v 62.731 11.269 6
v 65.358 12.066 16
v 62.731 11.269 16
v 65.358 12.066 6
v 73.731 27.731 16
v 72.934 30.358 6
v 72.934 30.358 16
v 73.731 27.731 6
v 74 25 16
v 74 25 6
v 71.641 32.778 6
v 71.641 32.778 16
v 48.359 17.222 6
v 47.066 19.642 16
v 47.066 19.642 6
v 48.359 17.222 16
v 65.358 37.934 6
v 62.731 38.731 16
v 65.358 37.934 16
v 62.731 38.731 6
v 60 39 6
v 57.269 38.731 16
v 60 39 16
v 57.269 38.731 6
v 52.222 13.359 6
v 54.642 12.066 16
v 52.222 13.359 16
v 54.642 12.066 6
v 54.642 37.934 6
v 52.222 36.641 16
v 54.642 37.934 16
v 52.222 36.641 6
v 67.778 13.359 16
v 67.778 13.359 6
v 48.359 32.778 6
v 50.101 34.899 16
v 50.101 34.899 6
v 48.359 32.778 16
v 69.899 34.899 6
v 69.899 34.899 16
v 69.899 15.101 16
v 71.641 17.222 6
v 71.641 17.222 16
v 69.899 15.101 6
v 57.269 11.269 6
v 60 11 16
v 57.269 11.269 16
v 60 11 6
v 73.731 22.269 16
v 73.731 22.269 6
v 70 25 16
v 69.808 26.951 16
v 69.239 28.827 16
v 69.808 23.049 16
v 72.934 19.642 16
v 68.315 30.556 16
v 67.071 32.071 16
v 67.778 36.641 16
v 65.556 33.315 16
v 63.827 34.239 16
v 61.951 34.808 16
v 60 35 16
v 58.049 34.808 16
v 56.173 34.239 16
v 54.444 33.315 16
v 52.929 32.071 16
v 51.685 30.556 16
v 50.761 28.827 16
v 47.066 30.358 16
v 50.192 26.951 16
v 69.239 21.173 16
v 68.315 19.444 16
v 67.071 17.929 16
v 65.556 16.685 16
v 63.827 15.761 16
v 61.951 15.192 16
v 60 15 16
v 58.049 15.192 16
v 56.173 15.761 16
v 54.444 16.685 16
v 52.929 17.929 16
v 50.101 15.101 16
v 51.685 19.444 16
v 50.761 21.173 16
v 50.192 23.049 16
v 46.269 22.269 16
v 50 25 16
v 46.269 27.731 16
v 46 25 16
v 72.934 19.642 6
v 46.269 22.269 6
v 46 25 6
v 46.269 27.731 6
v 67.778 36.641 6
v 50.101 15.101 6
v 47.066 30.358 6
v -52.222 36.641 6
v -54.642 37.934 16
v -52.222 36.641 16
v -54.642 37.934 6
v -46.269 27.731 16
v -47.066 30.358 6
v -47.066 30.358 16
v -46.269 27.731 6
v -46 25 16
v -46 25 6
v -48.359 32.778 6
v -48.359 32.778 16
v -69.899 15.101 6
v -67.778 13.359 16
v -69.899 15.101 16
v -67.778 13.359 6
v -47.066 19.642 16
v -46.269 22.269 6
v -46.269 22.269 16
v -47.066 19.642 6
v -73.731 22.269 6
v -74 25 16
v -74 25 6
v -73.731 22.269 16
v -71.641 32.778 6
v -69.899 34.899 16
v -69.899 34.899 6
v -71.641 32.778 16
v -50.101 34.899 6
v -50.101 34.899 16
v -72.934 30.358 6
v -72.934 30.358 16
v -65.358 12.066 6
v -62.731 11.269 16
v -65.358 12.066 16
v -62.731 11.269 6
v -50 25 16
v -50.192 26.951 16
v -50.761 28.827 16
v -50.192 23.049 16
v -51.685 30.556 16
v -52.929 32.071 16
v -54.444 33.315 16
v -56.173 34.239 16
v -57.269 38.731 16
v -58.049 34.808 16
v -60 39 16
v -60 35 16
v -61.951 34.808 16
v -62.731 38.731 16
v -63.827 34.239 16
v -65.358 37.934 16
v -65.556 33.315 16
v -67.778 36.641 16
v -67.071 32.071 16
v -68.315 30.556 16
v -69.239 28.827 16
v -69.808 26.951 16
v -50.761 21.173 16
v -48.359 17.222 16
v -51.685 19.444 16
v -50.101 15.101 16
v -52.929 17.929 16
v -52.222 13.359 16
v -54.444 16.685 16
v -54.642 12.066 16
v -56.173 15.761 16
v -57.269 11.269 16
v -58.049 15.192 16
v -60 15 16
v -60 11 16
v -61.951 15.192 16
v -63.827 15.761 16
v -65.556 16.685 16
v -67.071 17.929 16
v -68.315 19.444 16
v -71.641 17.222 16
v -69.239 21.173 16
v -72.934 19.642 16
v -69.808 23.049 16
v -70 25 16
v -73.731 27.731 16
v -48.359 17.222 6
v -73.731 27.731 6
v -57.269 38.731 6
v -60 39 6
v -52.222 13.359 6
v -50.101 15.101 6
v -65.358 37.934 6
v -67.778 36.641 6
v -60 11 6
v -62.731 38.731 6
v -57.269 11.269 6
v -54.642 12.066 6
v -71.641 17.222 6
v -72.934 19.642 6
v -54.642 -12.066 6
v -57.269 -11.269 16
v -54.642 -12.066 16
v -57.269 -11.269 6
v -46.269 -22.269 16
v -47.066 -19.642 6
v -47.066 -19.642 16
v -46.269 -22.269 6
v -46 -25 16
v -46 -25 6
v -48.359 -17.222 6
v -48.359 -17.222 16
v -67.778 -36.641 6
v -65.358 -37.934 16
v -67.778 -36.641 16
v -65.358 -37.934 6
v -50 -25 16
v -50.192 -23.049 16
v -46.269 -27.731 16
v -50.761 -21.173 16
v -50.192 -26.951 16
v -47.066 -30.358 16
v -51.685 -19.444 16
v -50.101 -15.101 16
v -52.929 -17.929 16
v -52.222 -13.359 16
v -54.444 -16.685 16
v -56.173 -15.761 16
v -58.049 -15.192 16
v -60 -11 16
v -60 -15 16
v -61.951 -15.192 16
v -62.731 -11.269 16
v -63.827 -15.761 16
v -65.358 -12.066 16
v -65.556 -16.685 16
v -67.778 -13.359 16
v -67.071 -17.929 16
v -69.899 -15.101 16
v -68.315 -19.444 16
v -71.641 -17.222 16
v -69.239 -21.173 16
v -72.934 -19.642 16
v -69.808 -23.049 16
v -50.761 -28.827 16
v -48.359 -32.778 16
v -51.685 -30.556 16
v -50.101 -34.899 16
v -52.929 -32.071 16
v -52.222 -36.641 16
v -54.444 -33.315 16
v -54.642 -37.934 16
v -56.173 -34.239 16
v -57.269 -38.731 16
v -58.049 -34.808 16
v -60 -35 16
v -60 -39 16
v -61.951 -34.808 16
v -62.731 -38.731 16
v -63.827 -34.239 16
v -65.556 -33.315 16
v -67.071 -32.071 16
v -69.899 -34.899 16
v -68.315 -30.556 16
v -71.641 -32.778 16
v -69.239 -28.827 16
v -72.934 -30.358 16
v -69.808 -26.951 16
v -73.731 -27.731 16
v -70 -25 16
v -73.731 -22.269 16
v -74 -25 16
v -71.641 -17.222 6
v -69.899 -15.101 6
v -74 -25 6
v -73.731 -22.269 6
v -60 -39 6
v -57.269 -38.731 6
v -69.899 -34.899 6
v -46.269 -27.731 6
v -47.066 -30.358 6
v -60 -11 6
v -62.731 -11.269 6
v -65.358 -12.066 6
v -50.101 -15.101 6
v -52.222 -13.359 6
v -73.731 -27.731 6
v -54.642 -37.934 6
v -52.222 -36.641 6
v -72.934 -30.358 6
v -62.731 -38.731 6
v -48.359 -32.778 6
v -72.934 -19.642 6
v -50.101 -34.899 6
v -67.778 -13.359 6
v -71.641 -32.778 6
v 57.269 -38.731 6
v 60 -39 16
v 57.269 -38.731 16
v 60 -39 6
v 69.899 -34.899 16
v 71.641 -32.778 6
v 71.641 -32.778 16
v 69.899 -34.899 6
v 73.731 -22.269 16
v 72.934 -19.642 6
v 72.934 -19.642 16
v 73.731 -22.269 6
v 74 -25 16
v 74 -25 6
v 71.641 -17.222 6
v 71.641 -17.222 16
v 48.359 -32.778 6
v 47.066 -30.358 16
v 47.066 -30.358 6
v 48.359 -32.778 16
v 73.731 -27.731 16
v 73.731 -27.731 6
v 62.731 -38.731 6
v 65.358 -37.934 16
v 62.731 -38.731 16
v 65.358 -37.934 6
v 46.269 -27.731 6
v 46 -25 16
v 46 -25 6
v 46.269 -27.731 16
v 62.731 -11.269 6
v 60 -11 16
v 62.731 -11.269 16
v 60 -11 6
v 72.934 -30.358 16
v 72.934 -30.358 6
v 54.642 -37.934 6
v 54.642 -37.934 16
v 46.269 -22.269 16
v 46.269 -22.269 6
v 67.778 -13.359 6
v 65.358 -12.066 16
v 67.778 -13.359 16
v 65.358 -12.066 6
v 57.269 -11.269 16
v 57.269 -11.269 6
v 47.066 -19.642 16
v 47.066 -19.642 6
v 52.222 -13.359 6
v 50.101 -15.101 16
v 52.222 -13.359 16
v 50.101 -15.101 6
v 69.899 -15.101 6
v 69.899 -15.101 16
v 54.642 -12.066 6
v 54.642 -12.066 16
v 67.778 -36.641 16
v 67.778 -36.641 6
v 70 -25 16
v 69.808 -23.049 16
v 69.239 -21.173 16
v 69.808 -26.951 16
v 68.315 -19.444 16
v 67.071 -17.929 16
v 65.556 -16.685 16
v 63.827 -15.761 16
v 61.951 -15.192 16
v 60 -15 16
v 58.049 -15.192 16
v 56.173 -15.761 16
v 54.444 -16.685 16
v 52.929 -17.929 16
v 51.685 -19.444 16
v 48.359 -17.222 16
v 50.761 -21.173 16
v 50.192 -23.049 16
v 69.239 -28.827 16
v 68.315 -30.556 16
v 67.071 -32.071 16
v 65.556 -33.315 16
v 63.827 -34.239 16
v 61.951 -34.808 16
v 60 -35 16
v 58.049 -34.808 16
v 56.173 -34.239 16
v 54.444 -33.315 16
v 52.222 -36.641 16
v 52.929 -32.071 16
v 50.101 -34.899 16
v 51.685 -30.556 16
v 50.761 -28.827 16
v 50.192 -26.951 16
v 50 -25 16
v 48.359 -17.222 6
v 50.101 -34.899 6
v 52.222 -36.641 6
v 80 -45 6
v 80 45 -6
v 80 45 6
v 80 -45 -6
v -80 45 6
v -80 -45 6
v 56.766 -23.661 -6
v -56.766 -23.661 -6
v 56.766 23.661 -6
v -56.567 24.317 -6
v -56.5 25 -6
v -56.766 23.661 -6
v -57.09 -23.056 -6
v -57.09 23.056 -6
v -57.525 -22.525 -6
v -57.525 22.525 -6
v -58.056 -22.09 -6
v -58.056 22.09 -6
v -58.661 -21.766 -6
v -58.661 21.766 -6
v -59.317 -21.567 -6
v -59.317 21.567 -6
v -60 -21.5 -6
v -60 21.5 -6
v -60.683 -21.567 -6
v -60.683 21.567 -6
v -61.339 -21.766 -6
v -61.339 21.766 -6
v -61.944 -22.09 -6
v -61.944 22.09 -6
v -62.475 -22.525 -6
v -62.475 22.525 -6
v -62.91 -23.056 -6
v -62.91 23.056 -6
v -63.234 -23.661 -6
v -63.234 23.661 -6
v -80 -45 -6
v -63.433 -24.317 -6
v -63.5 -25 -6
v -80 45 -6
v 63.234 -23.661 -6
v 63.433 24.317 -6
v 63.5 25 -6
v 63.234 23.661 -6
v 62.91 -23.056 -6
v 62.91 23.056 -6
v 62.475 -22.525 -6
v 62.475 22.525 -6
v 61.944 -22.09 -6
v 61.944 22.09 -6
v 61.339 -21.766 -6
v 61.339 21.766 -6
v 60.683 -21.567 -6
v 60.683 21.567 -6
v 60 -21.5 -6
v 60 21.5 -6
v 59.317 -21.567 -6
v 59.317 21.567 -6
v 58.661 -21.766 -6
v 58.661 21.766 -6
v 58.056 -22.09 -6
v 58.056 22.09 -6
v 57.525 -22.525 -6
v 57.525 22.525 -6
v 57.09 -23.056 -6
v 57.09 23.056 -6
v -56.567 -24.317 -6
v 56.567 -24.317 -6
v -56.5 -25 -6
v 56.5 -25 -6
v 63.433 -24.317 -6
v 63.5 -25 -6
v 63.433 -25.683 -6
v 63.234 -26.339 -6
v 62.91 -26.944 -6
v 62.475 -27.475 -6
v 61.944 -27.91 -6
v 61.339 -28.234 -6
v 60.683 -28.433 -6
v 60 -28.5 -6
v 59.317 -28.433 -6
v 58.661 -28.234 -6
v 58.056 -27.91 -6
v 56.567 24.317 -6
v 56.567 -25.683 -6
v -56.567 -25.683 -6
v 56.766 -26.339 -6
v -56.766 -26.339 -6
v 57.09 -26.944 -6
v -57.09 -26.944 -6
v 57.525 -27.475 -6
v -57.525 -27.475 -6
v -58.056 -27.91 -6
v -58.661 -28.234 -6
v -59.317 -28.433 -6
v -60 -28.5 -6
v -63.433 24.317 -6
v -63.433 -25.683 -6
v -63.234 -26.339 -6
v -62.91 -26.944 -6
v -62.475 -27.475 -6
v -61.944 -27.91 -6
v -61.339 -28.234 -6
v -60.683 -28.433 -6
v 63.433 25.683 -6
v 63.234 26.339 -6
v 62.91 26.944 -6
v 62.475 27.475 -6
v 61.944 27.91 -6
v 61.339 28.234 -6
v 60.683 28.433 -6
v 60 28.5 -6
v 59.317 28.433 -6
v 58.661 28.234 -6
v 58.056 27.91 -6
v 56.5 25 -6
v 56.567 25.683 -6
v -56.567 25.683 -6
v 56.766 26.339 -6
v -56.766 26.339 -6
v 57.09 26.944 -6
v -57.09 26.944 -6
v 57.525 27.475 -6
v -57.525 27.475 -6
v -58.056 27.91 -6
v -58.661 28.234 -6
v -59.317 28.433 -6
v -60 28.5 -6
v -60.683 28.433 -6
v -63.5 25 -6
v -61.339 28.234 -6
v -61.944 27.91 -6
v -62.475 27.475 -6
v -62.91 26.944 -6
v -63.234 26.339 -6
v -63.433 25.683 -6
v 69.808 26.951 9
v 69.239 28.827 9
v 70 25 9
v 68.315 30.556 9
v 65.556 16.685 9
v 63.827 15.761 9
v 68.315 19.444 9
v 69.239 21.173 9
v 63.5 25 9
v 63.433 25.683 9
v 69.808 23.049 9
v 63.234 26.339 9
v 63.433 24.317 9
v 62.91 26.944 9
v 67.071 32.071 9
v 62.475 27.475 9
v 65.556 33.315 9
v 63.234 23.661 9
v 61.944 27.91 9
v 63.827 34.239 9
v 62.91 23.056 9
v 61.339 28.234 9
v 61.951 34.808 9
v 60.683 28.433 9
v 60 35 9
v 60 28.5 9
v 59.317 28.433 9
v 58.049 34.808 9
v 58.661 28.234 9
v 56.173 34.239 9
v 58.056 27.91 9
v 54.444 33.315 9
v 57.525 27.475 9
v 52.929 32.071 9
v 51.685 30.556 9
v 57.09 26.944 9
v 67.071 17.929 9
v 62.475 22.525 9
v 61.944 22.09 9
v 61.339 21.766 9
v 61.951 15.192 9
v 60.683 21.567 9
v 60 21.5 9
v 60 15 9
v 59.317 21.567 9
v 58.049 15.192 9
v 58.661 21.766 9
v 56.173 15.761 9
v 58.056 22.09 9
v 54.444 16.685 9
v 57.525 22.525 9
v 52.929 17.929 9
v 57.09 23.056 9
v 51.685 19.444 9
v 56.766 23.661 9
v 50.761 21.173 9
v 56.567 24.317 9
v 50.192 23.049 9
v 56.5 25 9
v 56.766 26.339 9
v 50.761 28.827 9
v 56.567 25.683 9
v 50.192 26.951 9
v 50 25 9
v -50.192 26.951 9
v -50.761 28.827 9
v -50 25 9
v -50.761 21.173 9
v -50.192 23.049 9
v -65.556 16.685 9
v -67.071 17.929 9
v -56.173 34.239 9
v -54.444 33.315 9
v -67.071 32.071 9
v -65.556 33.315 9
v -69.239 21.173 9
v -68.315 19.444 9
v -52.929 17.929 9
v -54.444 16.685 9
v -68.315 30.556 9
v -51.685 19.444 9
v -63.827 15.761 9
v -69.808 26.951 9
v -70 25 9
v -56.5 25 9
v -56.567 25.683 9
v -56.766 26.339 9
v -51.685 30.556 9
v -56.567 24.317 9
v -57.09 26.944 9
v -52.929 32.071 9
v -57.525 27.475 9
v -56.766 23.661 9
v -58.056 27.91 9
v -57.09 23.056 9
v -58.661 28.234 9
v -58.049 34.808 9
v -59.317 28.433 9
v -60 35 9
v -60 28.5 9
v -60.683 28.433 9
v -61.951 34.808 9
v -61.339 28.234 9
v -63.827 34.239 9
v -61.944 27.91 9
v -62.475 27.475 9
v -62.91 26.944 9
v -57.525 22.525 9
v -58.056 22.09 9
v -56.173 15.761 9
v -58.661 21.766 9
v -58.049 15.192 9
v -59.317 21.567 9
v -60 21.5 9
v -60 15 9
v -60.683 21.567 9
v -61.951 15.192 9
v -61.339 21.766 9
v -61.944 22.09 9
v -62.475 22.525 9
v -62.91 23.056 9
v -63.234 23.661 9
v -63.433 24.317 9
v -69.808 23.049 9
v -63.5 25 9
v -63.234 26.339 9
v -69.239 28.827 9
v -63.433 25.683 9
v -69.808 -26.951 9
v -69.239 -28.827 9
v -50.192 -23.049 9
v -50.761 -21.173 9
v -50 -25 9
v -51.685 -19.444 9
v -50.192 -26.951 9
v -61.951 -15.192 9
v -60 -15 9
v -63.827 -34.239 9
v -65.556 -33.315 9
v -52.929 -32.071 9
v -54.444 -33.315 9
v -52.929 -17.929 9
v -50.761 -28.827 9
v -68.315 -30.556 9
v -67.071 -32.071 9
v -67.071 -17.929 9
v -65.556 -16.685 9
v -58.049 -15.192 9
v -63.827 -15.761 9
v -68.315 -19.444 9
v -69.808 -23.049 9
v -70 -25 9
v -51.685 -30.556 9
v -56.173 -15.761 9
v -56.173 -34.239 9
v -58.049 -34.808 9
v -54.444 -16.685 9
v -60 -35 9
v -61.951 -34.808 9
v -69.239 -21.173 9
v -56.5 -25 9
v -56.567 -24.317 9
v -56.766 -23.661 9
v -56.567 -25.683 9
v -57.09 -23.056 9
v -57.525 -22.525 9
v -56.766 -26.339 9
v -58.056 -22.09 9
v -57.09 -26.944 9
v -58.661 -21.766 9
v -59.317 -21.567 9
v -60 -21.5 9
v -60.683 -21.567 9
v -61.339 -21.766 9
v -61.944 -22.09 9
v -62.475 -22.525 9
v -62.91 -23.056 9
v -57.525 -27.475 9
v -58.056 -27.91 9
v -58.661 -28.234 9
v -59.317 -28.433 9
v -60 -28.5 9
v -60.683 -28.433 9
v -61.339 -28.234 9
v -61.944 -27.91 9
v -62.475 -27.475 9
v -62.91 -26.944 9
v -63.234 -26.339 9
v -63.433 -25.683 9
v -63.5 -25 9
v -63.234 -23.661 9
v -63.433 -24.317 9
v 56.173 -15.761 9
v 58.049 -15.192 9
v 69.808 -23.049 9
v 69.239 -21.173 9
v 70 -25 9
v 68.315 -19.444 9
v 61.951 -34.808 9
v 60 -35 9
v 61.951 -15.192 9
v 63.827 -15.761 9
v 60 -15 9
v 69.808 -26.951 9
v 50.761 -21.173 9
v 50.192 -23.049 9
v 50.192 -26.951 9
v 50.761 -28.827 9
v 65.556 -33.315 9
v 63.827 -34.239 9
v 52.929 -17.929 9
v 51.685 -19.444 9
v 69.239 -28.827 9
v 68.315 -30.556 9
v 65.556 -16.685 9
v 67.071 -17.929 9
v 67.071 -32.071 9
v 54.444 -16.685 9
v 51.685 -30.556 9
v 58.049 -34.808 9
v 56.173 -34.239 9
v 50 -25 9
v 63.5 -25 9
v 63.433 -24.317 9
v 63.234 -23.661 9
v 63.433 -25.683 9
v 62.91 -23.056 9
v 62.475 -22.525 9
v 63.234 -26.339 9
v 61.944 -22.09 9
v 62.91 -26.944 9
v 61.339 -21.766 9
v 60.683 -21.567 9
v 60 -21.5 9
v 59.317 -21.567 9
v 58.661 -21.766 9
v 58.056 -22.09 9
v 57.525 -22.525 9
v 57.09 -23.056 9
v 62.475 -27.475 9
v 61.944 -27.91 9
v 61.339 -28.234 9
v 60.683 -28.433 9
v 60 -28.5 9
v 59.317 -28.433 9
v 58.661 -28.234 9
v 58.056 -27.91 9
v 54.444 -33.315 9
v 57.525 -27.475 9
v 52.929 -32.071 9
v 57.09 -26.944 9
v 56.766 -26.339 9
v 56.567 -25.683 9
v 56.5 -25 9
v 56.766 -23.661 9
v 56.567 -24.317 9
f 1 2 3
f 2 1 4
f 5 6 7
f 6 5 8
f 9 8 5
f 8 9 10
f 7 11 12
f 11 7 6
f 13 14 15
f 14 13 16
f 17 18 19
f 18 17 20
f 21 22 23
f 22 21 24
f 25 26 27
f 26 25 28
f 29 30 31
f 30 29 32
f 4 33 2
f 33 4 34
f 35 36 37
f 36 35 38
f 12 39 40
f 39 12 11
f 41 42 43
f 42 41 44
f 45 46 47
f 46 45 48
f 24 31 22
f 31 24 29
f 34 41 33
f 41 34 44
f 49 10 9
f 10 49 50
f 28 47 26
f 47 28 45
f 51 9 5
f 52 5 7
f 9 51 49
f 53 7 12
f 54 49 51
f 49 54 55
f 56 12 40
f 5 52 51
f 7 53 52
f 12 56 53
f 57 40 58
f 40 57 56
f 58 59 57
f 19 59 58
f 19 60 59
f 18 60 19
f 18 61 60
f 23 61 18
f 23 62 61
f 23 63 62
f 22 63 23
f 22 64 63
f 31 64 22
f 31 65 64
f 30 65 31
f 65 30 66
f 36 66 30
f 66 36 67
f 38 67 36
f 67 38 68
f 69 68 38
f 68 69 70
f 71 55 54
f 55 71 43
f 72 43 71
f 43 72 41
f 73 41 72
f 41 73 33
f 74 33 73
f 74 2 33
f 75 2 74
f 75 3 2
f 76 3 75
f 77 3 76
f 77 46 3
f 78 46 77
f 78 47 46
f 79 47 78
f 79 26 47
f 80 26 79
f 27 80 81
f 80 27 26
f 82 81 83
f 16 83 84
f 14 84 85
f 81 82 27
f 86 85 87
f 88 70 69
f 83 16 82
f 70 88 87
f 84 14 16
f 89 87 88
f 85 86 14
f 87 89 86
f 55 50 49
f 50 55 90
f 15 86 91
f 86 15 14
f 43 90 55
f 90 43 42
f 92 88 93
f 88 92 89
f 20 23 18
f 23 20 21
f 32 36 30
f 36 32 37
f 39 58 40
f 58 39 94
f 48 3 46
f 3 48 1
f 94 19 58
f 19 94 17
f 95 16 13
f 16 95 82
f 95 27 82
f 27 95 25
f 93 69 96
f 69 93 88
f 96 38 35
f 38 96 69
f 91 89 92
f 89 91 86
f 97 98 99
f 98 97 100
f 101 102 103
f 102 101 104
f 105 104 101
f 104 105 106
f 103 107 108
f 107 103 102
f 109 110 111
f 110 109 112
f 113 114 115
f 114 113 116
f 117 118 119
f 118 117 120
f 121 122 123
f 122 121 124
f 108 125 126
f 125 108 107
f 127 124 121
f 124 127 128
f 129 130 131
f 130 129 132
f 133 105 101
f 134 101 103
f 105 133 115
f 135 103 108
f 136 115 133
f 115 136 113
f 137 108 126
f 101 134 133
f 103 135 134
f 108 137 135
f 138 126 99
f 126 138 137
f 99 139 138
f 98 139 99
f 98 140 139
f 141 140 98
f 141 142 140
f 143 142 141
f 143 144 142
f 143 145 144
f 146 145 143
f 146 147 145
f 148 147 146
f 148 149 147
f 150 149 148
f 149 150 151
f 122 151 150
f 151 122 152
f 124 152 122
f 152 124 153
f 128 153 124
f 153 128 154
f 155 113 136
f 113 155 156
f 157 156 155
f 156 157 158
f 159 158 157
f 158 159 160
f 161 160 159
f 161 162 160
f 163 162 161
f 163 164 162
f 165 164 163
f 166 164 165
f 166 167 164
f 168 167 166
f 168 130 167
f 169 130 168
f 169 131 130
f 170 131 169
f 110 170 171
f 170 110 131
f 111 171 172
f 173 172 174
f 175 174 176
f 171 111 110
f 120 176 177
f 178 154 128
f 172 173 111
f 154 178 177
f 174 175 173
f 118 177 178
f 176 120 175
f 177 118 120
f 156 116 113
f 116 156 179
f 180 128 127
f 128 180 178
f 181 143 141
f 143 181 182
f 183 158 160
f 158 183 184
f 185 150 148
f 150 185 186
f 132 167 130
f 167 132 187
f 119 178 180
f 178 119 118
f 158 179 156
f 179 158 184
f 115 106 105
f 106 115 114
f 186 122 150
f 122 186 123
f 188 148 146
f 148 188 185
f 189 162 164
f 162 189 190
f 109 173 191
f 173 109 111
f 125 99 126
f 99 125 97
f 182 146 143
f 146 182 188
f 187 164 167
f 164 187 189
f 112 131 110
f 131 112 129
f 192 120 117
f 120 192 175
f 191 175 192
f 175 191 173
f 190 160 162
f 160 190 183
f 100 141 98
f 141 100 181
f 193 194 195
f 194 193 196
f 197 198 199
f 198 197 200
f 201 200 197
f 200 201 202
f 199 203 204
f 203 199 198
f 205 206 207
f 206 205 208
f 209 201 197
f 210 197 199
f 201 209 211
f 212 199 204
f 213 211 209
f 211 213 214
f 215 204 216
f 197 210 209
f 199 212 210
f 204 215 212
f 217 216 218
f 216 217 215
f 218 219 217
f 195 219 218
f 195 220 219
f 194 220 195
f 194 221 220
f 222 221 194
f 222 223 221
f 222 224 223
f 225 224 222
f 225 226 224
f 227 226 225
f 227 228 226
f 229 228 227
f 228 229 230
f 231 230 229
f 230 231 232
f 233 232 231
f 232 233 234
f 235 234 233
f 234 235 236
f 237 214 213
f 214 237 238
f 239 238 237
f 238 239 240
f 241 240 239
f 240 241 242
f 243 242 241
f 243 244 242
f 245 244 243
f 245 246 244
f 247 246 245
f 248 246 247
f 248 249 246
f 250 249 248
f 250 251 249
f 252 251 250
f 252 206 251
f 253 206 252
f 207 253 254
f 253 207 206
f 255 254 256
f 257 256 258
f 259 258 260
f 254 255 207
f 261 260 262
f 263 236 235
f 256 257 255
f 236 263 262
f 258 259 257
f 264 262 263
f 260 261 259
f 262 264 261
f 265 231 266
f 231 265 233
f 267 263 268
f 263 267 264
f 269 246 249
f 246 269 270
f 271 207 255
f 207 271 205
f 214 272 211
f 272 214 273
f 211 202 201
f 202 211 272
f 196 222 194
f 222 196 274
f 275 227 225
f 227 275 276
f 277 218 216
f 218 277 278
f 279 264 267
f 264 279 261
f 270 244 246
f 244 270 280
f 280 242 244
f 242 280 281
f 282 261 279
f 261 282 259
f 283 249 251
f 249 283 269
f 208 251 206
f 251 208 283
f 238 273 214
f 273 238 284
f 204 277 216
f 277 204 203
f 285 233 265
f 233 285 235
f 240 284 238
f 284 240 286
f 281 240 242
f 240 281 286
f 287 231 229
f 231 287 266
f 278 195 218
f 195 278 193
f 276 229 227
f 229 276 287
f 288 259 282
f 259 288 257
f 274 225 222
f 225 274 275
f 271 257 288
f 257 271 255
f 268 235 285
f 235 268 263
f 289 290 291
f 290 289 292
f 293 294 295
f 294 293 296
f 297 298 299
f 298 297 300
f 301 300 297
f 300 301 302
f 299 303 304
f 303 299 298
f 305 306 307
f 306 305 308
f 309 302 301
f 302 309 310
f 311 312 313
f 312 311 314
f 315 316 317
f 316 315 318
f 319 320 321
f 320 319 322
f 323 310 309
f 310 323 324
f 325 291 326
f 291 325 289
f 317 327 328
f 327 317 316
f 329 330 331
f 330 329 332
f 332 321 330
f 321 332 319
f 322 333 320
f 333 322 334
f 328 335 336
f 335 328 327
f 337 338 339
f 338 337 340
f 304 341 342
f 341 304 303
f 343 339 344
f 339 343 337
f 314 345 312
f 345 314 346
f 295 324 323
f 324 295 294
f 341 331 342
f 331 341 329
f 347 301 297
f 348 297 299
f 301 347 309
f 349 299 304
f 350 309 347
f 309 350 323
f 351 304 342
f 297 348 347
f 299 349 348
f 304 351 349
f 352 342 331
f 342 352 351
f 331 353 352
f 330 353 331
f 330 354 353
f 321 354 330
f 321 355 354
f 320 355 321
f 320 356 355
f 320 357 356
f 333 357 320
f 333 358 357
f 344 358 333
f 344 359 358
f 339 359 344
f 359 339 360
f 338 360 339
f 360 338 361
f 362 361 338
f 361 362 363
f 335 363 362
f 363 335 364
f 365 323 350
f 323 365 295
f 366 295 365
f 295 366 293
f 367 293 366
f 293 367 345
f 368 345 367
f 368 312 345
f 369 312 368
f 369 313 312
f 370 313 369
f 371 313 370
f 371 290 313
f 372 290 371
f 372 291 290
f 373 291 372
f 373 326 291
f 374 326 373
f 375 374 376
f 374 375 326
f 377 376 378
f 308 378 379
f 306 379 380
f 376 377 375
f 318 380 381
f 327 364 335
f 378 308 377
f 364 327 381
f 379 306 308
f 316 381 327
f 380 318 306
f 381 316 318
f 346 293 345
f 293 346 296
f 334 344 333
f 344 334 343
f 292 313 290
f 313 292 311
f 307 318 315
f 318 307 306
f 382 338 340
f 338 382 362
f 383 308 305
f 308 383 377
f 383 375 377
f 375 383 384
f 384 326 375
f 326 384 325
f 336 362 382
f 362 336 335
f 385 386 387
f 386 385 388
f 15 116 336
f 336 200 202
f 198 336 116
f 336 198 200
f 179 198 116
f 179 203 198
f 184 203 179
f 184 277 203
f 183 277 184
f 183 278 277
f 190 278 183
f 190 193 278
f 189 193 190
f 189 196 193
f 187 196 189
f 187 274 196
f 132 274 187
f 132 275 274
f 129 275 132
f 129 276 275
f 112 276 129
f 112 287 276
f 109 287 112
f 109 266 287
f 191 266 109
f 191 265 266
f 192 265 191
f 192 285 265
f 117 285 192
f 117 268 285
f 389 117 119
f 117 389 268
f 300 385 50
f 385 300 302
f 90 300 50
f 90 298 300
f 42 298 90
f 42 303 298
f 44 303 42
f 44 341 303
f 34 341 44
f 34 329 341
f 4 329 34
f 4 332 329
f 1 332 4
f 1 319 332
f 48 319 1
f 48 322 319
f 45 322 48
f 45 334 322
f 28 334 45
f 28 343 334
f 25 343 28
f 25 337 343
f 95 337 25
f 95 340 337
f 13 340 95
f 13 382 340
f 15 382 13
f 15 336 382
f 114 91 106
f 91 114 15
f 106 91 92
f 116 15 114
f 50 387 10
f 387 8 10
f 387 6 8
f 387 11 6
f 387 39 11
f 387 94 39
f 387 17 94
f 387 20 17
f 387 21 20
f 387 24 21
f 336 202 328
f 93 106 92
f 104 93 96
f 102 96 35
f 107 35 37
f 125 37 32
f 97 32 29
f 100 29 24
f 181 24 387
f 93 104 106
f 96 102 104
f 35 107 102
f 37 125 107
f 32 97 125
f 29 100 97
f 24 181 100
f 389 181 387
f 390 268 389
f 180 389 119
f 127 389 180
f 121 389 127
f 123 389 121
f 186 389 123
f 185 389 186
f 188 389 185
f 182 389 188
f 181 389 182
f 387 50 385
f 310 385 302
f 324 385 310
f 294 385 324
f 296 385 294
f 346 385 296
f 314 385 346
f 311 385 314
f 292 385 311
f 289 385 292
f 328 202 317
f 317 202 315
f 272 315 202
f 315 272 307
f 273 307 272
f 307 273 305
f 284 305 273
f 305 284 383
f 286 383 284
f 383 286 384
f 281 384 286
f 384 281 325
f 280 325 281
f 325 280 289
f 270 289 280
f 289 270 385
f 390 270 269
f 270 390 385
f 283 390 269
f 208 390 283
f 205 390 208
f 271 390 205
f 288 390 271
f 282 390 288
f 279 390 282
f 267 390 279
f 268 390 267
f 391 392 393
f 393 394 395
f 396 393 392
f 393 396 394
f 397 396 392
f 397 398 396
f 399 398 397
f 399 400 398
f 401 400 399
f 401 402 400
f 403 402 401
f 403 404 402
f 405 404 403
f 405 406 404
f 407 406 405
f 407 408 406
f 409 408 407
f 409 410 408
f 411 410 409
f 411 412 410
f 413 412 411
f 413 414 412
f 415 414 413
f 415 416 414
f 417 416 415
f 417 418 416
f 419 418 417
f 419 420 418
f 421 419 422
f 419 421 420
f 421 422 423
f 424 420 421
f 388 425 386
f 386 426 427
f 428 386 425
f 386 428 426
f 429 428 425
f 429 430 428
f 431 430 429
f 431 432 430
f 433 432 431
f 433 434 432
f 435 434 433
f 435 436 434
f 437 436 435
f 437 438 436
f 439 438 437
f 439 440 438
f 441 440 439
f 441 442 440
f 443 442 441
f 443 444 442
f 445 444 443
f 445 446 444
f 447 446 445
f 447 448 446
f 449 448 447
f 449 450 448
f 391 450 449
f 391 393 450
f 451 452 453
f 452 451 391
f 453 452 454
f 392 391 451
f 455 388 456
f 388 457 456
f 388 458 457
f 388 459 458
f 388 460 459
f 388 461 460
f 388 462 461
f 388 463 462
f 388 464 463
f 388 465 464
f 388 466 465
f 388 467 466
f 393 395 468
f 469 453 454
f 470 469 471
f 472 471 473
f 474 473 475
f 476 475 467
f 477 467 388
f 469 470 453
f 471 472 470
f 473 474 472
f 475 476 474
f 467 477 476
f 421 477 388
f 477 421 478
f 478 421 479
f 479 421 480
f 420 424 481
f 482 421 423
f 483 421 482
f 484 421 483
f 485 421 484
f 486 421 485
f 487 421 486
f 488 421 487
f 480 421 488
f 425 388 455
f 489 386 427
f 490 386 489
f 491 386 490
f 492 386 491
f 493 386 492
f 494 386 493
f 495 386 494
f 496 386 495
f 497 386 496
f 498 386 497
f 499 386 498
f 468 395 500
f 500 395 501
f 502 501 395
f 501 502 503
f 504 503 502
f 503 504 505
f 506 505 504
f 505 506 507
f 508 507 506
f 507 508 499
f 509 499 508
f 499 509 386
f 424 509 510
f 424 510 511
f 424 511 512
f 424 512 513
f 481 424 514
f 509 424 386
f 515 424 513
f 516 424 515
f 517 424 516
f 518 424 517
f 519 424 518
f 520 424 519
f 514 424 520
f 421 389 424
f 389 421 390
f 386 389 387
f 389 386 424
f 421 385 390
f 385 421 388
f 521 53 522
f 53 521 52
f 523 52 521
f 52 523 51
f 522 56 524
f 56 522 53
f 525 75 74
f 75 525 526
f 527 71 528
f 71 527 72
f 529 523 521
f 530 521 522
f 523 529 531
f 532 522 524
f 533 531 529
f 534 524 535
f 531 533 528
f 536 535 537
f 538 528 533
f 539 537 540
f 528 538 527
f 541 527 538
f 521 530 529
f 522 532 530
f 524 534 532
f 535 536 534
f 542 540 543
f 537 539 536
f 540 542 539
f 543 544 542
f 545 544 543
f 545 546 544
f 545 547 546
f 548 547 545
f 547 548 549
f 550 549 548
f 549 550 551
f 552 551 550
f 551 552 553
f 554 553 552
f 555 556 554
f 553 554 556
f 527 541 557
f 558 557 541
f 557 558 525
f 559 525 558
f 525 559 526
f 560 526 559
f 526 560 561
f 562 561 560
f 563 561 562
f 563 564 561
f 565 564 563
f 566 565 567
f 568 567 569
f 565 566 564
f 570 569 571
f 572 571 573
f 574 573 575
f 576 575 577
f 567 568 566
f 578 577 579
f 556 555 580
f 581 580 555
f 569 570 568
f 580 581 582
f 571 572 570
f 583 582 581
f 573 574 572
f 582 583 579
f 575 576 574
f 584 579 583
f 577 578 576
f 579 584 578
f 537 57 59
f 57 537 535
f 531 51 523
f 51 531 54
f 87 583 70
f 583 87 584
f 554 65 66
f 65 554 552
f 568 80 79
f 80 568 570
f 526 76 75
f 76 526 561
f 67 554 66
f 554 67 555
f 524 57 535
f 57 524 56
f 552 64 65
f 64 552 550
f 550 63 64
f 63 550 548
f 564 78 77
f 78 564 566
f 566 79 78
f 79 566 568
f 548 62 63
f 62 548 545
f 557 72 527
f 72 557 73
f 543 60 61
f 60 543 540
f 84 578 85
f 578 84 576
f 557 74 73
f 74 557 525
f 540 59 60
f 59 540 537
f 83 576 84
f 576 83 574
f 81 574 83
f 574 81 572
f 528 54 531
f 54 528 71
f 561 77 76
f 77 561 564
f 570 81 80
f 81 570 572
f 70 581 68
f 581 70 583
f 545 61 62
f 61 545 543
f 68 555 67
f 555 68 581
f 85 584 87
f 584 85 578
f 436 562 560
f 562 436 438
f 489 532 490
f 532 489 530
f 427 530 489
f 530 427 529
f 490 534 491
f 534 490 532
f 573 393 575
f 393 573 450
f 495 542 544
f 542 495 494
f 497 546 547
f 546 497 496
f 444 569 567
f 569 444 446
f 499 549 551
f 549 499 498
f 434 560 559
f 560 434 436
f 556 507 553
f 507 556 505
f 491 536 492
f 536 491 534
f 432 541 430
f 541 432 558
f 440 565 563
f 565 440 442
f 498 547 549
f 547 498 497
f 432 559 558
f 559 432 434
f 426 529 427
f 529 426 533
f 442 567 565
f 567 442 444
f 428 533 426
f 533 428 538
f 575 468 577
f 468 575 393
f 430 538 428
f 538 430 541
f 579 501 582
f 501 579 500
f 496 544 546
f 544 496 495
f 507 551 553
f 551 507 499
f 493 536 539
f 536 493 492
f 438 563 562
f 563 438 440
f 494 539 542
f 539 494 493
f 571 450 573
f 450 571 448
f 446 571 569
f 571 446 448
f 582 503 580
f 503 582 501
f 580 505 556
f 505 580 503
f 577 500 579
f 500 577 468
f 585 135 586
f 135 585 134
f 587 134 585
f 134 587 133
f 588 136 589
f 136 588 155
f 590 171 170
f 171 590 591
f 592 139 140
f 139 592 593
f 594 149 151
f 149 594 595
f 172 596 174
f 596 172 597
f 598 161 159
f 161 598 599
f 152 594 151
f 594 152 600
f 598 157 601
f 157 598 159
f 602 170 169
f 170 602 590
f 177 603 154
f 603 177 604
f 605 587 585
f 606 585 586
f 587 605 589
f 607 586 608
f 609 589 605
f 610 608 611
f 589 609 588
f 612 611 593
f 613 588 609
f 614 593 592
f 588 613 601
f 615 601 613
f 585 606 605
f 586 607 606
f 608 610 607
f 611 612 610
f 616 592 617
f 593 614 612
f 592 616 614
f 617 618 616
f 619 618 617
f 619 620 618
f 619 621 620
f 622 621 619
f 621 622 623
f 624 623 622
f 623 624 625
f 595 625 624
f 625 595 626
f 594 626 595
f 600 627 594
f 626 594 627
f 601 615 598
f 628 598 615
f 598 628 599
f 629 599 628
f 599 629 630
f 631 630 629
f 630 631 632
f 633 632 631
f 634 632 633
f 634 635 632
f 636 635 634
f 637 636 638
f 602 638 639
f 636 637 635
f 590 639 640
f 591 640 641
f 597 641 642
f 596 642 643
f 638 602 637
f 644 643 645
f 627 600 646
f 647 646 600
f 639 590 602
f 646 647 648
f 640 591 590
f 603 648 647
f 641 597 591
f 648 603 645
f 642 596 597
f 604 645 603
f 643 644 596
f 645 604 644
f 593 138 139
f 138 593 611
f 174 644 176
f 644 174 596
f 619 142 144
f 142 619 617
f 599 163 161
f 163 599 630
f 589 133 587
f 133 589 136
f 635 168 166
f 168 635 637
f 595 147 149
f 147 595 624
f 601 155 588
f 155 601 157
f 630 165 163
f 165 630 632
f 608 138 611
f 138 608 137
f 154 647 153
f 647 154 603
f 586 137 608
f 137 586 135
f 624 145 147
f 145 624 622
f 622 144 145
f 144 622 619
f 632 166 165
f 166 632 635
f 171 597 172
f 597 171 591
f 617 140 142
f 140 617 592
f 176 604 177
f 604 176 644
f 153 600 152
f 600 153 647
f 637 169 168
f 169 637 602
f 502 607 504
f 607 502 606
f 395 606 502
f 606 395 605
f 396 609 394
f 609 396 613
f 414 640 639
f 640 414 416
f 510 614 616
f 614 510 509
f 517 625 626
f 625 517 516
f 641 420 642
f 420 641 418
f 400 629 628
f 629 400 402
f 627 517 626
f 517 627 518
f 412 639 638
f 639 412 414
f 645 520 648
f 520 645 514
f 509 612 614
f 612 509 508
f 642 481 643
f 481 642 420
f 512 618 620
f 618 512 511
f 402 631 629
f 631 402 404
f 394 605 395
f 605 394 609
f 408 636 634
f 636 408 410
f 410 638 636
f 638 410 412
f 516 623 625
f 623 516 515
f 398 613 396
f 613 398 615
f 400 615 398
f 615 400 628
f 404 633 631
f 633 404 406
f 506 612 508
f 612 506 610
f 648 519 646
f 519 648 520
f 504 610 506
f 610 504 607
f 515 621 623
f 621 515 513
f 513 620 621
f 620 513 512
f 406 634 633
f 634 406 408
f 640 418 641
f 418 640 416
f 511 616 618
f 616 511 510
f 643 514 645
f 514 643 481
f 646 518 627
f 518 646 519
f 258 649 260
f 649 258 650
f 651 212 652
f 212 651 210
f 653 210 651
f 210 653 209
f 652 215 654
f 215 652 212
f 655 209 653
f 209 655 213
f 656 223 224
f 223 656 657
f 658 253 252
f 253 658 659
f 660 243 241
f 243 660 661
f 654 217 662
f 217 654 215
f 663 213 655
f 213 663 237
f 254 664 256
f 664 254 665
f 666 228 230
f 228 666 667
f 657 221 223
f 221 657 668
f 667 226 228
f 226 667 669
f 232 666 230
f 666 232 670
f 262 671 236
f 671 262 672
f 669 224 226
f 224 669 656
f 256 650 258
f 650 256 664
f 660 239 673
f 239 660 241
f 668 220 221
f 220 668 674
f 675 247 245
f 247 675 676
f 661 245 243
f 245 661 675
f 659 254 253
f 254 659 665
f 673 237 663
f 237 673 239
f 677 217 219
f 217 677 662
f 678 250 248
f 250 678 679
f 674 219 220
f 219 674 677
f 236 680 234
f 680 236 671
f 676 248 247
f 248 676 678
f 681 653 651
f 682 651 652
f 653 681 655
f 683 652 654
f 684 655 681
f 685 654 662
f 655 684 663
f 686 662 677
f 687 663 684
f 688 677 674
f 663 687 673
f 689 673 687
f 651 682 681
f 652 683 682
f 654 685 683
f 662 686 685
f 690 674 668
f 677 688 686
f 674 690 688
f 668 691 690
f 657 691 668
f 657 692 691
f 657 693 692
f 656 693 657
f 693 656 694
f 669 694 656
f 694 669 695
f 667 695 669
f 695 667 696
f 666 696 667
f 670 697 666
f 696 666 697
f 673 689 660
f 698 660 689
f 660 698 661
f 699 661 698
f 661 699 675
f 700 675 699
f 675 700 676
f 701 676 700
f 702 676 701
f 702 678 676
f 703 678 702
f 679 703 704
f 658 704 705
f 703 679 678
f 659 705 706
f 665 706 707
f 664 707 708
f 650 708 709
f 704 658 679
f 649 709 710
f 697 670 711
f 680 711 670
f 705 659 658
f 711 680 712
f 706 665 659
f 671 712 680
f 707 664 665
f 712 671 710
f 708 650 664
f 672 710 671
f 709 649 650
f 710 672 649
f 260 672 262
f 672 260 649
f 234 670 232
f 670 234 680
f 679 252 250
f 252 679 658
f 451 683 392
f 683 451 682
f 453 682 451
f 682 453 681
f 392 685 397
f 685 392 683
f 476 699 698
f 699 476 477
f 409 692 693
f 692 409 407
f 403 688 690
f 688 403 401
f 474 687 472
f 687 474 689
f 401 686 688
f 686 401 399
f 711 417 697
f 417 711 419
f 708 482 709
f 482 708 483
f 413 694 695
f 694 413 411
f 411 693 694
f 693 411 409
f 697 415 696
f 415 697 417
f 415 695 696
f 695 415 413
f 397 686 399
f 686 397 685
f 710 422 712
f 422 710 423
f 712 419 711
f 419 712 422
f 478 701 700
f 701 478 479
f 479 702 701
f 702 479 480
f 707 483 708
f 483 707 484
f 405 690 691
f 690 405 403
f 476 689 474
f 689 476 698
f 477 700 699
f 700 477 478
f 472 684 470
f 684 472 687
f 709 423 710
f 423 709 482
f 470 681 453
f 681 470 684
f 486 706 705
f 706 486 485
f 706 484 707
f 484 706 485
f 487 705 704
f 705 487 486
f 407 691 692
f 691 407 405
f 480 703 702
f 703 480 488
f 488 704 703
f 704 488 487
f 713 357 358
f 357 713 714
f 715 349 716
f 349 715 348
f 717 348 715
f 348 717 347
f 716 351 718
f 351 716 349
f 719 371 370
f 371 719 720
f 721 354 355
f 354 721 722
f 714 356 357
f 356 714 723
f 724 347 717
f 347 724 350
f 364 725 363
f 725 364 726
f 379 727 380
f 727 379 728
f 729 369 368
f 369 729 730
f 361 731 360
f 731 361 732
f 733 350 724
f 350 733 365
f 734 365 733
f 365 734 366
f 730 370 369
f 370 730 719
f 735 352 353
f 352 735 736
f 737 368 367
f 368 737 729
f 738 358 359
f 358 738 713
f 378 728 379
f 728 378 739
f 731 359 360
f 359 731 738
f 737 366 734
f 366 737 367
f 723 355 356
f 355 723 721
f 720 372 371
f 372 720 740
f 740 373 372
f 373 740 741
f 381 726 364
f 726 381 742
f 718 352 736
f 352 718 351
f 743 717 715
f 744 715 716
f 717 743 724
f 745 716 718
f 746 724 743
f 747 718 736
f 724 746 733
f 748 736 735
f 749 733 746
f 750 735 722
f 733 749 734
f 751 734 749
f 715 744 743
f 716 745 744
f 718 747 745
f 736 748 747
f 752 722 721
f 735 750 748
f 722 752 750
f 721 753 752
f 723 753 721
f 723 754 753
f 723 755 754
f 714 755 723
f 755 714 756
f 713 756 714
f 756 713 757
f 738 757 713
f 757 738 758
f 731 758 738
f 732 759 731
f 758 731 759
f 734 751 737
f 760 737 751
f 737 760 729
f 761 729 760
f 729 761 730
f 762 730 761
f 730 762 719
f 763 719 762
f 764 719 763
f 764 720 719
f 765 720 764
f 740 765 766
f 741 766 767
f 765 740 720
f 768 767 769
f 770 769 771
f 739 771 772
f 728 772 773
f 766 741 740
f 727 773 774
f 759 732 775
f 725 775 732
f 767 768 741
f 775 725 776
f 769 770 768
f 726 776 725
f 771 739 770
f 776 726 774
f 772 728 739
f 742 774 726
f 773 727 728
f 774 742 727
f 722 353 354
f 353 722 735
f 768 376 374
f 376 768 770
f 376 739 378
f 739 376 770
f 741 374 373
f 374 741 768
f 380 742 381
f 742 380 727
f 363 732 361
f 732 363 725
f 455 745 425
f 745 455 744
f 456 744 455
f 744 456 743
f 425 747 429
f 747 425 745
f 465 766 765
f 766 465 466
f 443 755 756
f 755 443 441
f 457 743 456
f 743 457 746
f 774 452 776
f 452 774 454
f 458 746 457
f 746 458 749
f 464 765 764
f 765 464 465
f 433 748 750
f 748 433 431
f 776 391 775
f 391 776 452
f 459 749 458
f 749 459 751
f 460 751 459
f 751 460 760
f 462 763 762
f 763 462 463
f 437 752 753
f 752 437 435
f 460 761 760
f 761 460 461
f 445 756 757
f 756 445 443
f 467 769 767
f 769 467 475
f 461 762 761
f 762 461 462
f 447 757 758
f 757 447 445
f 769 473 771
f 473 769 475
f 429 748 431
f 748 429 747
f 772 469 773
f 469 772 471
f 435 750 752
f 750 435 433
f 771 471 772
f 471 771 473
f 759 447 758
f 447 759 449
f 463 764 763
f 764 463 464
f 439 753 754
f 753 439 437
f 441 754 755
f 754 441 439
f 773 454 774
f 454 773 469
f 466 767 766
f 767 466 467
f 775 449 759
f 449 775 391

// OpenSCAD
$fn = 32;

// ----------------------------------------------------------------------
// Socket pad plate
// bosses with counterbored sockets for the screws
// ----------------------------------------------------------------------

// --- parameters (mm) ---
base_t = 12;            // base plate thickness
boss_h = 10;            // boss height above the base plate
boss_d = 28;            // boss diameter
socket_d = 20;          // socket diameter
socket_depth = 7;       // socket depth from the boss face
bolt_d = 7;             // screw clearance hole through the socket floor
plate = [160, 90, 12];  // overall size (x, y, z)
edge = 20;              // boss centre offset from the plate edge
pads = 4;               // boss count, one per corner

// --- derived feature positions (mm) ---
height = base_t + boss_h;        // = 22   overall height of the part
corner_x = plate[0] / 2 - edge;  // = 60   boss centre X
corner_y = plate[1] / 2 - edge;  // = 25   boss centre Y
feature_centers = [
  [corner_x, corner_y],
  [-corner_x, corner_y],
  [-corner_x, -corner_y],
  [corner_x, -corner_y]
];   // boss centres: sockets, holes and the pads themselves are placed from here

// base plate, bosses on feature_centers, socket + through hole in each
difference() {
  union() {
    cube(plate, center = true);
    for (centre = feature_centers)
      translate([centre[0], centre[1], plate[2] / 2 - 1])
        cylinder(d = boss_d, h = boss_h + 1);
  }
  for (centre = feature_centers) {
    translate([centre[0], centre[1], plate[2] / 2 + boss_h - socket_depth])
      cylinder(d = socket_d, h = socket_depth + 1);
    translate([centre[0], centre[1], -height])
      cylinder(d = bolt_d, h = 2 * height + 2);  // through the socket floor
  }
}
